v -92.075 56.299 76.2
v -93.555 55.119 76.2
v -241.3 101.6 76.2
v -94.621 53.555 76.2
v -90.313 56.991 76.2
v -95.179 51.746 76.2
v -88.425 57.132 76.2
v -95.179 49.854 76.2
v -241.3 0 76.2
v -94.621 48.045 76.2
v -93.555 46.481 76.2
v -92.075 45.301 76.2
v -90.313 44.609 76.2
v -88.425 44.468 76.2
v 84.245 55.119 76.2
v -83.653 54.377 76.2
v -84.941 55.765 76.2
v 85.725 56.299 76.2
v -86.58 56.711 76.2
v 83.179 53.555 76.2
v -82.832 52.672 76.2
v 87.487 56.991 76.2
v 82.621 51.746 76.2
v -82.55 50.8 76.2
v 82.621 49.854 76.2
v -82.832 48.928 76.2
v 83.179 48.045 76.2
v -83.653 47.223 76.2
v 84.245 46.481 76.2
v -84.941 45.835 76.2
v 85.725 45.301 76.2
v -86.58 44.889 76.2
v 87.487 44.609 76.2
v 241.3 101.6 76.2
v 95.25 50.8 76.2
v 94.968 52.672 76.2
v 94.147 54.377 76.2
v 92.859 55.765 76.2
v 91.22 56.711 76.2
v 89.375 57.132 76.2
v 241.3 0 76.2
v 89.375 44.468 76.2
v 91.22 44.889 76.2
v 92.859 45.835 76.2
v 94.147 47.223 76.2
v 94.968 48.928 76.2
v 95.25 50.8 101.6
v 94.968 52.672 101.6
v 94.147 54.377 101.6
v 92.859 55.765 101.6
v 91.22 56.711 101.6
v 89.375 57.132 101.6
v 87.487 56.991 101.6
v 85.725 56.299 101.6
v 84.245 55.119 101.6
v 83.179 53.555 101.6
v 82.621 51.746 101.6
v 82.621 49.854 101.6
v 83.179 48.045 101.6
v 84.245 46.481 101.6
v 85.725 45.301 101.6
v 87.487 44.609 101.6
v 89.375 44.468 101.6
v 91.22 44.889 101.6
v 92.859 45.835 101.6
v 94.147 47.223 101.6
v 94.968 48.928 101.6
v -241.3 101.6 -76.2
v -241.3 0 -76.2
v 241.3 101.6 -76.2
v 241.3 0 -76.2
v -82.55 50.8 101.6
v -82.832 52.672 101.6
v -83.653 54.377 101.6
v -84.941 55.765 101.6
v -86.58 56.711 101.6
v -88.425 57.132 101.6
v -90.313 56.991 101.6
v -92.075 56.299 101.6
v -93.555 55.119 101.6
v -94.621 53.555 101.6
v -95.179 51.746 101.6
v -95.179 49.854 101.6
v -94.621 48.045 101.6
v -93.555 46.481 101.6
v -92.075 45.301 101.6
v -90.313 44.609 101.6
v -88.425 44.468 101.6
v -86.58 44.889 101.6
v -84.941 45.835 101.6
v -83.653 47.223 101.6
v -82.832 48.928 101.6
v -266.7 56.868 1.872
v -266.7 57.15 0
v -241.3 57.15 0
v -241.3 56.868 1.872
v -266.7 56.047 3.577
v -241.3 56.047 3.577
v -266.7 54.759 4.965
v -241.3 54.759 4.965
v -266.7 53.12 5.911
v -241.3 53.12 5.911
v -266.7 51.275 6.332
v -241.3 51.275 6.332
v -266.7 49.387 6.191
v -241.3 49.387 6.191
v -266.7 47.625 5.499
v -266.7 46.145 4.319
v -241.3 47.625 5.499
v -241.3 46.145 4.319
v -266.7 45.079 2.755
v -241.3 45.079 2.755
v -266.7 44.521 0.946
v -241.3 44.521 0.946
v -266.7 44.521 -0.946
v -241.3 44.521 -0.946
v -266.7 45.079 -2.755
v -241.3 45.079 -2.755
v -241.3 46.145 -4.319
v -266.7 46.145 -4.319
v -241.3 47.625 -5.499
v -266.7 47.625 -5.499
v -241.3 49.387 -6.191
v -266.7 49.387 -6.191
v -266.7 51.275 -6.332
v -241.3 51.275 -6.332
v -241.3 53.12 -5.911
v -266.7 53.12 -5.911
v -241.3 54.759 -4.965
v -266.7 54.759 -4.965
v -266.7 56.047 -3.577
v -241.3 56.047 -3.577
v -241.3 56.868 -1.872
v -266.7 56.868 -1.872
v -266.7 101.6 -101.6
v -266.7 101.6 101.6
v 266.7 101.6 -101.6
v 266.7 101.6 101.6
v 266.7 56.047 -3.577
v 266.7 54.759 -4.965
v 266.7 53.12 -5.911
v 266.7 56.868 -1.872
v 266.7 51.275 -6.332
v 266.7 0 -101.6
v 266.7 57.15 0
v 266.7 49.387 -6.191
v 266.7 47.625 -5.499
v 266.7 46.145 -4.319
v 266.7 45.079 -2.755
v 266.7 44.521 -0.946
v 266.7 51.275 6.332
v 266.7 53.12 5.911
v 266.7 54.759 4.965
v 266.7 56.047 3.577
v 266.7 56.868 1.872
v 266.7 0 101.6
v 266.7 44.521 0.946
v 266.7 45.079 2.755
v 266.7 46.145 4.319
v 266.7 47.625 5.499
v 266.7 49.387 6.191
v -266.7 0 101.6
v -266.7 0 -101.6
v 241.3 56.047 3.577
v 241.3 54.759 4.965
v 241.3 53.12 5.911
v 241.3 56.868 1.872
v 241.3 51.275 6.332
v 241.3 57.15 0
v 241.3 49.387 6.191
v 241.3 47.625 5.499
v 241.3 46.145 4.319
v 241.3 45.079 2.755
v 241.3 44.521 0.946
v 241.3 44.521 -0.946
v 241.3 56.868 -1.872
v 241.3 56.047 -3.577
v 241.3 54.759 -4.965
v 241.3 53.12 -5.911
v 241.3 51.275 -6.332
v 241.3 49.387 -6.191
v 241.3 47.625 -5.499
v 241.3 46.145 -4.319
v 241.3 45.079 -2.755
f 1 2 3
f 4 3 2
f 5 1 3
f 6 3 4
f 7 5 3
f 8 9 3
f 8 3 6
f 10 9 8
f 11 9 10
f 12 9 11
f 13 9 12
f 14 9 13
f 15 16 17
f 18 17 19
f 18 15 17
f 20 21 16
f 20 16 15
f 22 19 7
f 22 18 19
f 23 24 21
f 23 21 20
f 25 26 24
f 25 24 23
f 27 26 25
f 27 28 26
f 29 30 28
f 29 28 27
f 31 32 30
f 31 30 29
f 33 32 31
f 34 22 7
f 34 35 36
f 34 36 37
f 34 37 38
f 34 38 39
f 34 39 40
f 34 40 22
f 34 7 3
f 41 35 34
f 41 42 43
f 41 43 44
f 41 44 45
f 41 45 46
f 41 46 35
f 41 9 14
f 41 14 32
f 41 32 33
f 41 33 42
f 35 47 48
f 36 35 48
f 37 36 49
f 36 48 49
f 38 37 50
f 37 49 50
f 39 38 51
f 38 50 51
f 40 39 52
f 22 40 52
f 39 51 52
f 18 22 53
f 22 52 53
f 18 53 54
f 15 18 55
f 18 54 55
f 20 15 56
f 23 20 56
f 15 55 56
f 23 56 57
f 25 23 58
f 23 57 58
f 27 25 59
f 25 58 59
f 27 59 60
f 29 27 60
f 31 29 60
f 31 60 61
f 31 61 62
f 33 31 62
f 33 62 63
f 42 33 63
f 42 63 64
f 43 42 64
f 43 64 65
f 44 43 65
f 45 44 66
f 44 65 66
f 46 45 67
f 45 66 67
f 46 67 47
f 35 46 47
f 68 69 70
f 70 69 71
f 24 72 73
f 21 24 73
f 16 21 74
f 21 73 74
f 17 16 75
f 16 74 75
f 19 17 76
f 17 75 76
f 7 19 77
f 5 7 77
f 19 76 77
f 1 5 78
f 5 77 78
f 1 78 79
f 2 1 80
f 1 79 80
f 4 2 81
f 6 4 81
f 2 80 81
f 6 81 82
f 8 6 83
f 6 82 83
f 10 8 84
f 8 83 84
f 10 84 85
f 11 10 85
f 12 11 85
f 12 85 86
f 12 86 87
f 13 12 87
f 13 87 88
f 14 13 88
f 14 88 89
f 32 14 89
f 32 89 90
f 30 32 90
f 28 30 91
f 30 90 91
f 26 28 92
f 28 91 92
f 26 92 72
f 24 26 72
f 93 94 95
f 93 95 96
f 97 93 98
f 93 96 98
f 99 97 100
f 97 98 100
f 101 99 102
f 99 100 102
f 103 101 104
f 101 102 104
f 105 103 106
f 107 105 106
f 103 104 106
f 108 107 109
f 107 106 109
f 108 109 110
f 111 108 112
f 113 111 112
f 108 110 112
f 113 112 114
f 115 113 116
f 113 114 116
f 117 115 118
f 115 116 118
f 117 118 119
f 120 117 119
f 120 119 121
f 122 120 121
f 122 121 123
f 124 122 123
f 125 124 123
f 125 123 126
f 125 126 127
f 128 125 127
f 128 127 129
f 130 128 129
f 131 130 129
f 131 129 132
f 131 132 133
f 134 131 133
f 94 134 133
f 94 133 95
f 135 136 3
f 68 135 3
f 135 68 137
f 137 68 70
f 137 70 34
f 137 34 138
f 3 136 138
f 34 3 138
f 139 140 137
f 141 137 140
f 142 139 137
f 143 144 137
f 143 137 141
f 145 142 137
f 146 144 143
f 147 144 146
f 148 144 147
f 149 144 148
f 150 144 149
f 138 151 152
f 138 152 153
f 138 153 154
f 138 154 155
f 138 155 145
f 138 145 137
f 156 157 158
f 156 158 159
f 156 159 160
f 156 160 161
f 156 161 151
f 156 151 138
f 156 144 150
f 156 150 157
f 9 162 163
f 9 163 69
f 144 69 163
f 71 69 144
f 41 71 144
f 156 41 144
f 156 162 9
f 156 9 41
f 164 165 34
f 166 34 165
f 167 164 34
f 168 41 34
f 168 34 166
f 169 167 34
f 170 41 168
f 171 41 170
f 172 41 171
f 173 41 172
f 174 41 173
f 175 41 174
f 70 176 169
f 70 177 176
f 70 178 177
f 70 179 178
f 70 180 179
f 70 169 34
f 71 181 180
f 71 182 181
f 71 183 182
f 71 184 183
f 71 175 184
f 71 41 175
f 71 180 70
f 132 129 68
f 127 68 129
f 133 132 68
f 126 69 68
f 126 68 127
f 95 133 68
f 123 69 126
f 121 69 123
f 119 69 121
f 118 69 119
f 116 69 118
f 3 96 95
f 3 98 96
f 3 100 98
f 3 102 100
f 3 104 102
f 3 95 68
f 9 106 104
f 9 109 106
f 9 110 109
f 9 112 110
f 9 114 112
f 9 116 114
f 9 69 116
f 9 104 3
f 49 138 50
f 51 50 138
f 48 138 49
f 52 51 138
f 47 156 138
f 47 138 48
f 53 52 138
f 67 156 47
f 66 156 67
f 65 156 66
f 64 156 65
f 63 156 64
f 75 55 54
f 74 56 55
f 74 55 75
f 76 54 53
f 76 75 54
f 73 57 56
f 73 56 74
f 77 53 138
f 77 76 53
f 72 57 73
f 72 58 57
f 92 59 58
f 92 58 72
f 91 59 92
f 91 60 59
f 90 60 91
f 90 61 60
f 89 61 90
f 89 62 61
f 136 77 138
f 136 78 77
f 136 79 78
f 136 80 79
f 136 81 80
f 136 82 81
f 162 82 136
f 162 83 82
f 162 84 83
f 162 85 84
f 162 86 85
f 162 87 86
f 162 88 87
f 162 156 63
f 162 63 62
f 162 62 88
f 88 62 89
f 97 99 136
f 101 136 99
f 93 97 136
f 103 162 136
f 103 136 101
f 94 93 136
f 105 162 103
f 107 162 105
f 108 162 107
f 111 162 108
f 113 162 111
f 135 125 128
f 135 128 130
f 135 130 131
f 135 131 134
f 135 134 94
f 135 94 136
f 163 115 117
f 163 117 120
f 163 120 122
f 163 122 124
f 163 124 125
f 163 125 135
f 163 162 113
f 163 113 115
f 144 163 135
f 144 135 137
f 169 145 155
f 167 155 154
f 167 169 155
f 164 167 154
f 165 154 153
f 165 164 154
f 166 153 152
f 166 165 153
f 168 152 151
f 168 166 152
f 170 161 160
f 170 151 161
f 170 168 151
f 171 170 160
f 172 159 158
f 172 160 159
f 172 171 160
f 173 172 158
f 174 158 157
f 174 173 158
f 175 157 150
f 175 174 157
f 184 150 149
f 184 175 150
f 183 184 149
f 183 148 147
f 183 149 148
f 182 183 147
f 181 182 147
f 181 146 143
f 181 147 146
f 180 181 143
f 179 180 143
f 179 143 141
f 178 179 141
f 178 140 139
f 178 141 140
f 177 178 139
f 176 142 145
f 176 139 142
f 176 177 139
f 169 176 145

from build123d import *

# Parameters (mm, degrees)
F0_W          = 482.6
F0_H          = 25.4
F1_DEPTH      = 101.6
F2_W          = 482.6
F2_H          = 152.4
F3_DEPTH      = 101.6
F4_R          = 6.35
F5_DEPTH      = 266.701
F5_DEPTH_BACK = 266.701
F6_R          = 6.35
F7_DEPTH      = 25.4


with BuildPart() as f1:
    # F0 (on Front) → F1 (new body)
    with BuildSketch(Plane.XZ):
        Polygon((266.7, 101.6), (-266.7, 101.6), (-266.7, 76.2), (-241.3, 76.2), (241.3, 76.2), (266.7, 76.2), align=None)
        Polygon((-241.3, 76.2), (-266.7, 76.2), (-266.7, -101.6), (-241.3, -101.6), (-241.3, -76.2), align=None)
        Polygon((266.7, -101.6), (266.7, 76.2), (241.3, 76.2), (241.3, -76.2), (241.3, -101.6), align=None)
        with Locations((0, -88.9)):
            Rectangle(F0_W, F0_H)
    extrude(amount=-F1_DEPTH)

    # F2 (on face) → F3 (cut)
    with BuildSketch(Plane.XZ):
        Rectangle(F2_W, F2_H)
    extrude(amount=-F3_DEPTH, mode=Mode.SUBTRACT)

    # F4 (on Right) → F5 (cut, two sides)
    with BuildSketch(Plane.YZ) as f5_sk:
        with Locations((50.8, 0)):
            Circle(F4_R)
    extrude(amount=F5_DEPTH, mode=Mode.SUBTRACT)
    extrude(f5_sk.sketch, amount=-F5_DEPTH_BACK, mode=Mode.SUBTRACT)

    # F6 (on face) → F7 (cut)
    with BuildSketch(Plane.XY.offset(101.6)):
        with Locations((-88.9, 50.8)):
            Circle(F6_R)
        with Locations((88.9, 50.8)):
            Circle(F6_R)
    extrude(amount=-F7_DEPTH, mode=Mode.SUBTRACT)


solid = f1.part
